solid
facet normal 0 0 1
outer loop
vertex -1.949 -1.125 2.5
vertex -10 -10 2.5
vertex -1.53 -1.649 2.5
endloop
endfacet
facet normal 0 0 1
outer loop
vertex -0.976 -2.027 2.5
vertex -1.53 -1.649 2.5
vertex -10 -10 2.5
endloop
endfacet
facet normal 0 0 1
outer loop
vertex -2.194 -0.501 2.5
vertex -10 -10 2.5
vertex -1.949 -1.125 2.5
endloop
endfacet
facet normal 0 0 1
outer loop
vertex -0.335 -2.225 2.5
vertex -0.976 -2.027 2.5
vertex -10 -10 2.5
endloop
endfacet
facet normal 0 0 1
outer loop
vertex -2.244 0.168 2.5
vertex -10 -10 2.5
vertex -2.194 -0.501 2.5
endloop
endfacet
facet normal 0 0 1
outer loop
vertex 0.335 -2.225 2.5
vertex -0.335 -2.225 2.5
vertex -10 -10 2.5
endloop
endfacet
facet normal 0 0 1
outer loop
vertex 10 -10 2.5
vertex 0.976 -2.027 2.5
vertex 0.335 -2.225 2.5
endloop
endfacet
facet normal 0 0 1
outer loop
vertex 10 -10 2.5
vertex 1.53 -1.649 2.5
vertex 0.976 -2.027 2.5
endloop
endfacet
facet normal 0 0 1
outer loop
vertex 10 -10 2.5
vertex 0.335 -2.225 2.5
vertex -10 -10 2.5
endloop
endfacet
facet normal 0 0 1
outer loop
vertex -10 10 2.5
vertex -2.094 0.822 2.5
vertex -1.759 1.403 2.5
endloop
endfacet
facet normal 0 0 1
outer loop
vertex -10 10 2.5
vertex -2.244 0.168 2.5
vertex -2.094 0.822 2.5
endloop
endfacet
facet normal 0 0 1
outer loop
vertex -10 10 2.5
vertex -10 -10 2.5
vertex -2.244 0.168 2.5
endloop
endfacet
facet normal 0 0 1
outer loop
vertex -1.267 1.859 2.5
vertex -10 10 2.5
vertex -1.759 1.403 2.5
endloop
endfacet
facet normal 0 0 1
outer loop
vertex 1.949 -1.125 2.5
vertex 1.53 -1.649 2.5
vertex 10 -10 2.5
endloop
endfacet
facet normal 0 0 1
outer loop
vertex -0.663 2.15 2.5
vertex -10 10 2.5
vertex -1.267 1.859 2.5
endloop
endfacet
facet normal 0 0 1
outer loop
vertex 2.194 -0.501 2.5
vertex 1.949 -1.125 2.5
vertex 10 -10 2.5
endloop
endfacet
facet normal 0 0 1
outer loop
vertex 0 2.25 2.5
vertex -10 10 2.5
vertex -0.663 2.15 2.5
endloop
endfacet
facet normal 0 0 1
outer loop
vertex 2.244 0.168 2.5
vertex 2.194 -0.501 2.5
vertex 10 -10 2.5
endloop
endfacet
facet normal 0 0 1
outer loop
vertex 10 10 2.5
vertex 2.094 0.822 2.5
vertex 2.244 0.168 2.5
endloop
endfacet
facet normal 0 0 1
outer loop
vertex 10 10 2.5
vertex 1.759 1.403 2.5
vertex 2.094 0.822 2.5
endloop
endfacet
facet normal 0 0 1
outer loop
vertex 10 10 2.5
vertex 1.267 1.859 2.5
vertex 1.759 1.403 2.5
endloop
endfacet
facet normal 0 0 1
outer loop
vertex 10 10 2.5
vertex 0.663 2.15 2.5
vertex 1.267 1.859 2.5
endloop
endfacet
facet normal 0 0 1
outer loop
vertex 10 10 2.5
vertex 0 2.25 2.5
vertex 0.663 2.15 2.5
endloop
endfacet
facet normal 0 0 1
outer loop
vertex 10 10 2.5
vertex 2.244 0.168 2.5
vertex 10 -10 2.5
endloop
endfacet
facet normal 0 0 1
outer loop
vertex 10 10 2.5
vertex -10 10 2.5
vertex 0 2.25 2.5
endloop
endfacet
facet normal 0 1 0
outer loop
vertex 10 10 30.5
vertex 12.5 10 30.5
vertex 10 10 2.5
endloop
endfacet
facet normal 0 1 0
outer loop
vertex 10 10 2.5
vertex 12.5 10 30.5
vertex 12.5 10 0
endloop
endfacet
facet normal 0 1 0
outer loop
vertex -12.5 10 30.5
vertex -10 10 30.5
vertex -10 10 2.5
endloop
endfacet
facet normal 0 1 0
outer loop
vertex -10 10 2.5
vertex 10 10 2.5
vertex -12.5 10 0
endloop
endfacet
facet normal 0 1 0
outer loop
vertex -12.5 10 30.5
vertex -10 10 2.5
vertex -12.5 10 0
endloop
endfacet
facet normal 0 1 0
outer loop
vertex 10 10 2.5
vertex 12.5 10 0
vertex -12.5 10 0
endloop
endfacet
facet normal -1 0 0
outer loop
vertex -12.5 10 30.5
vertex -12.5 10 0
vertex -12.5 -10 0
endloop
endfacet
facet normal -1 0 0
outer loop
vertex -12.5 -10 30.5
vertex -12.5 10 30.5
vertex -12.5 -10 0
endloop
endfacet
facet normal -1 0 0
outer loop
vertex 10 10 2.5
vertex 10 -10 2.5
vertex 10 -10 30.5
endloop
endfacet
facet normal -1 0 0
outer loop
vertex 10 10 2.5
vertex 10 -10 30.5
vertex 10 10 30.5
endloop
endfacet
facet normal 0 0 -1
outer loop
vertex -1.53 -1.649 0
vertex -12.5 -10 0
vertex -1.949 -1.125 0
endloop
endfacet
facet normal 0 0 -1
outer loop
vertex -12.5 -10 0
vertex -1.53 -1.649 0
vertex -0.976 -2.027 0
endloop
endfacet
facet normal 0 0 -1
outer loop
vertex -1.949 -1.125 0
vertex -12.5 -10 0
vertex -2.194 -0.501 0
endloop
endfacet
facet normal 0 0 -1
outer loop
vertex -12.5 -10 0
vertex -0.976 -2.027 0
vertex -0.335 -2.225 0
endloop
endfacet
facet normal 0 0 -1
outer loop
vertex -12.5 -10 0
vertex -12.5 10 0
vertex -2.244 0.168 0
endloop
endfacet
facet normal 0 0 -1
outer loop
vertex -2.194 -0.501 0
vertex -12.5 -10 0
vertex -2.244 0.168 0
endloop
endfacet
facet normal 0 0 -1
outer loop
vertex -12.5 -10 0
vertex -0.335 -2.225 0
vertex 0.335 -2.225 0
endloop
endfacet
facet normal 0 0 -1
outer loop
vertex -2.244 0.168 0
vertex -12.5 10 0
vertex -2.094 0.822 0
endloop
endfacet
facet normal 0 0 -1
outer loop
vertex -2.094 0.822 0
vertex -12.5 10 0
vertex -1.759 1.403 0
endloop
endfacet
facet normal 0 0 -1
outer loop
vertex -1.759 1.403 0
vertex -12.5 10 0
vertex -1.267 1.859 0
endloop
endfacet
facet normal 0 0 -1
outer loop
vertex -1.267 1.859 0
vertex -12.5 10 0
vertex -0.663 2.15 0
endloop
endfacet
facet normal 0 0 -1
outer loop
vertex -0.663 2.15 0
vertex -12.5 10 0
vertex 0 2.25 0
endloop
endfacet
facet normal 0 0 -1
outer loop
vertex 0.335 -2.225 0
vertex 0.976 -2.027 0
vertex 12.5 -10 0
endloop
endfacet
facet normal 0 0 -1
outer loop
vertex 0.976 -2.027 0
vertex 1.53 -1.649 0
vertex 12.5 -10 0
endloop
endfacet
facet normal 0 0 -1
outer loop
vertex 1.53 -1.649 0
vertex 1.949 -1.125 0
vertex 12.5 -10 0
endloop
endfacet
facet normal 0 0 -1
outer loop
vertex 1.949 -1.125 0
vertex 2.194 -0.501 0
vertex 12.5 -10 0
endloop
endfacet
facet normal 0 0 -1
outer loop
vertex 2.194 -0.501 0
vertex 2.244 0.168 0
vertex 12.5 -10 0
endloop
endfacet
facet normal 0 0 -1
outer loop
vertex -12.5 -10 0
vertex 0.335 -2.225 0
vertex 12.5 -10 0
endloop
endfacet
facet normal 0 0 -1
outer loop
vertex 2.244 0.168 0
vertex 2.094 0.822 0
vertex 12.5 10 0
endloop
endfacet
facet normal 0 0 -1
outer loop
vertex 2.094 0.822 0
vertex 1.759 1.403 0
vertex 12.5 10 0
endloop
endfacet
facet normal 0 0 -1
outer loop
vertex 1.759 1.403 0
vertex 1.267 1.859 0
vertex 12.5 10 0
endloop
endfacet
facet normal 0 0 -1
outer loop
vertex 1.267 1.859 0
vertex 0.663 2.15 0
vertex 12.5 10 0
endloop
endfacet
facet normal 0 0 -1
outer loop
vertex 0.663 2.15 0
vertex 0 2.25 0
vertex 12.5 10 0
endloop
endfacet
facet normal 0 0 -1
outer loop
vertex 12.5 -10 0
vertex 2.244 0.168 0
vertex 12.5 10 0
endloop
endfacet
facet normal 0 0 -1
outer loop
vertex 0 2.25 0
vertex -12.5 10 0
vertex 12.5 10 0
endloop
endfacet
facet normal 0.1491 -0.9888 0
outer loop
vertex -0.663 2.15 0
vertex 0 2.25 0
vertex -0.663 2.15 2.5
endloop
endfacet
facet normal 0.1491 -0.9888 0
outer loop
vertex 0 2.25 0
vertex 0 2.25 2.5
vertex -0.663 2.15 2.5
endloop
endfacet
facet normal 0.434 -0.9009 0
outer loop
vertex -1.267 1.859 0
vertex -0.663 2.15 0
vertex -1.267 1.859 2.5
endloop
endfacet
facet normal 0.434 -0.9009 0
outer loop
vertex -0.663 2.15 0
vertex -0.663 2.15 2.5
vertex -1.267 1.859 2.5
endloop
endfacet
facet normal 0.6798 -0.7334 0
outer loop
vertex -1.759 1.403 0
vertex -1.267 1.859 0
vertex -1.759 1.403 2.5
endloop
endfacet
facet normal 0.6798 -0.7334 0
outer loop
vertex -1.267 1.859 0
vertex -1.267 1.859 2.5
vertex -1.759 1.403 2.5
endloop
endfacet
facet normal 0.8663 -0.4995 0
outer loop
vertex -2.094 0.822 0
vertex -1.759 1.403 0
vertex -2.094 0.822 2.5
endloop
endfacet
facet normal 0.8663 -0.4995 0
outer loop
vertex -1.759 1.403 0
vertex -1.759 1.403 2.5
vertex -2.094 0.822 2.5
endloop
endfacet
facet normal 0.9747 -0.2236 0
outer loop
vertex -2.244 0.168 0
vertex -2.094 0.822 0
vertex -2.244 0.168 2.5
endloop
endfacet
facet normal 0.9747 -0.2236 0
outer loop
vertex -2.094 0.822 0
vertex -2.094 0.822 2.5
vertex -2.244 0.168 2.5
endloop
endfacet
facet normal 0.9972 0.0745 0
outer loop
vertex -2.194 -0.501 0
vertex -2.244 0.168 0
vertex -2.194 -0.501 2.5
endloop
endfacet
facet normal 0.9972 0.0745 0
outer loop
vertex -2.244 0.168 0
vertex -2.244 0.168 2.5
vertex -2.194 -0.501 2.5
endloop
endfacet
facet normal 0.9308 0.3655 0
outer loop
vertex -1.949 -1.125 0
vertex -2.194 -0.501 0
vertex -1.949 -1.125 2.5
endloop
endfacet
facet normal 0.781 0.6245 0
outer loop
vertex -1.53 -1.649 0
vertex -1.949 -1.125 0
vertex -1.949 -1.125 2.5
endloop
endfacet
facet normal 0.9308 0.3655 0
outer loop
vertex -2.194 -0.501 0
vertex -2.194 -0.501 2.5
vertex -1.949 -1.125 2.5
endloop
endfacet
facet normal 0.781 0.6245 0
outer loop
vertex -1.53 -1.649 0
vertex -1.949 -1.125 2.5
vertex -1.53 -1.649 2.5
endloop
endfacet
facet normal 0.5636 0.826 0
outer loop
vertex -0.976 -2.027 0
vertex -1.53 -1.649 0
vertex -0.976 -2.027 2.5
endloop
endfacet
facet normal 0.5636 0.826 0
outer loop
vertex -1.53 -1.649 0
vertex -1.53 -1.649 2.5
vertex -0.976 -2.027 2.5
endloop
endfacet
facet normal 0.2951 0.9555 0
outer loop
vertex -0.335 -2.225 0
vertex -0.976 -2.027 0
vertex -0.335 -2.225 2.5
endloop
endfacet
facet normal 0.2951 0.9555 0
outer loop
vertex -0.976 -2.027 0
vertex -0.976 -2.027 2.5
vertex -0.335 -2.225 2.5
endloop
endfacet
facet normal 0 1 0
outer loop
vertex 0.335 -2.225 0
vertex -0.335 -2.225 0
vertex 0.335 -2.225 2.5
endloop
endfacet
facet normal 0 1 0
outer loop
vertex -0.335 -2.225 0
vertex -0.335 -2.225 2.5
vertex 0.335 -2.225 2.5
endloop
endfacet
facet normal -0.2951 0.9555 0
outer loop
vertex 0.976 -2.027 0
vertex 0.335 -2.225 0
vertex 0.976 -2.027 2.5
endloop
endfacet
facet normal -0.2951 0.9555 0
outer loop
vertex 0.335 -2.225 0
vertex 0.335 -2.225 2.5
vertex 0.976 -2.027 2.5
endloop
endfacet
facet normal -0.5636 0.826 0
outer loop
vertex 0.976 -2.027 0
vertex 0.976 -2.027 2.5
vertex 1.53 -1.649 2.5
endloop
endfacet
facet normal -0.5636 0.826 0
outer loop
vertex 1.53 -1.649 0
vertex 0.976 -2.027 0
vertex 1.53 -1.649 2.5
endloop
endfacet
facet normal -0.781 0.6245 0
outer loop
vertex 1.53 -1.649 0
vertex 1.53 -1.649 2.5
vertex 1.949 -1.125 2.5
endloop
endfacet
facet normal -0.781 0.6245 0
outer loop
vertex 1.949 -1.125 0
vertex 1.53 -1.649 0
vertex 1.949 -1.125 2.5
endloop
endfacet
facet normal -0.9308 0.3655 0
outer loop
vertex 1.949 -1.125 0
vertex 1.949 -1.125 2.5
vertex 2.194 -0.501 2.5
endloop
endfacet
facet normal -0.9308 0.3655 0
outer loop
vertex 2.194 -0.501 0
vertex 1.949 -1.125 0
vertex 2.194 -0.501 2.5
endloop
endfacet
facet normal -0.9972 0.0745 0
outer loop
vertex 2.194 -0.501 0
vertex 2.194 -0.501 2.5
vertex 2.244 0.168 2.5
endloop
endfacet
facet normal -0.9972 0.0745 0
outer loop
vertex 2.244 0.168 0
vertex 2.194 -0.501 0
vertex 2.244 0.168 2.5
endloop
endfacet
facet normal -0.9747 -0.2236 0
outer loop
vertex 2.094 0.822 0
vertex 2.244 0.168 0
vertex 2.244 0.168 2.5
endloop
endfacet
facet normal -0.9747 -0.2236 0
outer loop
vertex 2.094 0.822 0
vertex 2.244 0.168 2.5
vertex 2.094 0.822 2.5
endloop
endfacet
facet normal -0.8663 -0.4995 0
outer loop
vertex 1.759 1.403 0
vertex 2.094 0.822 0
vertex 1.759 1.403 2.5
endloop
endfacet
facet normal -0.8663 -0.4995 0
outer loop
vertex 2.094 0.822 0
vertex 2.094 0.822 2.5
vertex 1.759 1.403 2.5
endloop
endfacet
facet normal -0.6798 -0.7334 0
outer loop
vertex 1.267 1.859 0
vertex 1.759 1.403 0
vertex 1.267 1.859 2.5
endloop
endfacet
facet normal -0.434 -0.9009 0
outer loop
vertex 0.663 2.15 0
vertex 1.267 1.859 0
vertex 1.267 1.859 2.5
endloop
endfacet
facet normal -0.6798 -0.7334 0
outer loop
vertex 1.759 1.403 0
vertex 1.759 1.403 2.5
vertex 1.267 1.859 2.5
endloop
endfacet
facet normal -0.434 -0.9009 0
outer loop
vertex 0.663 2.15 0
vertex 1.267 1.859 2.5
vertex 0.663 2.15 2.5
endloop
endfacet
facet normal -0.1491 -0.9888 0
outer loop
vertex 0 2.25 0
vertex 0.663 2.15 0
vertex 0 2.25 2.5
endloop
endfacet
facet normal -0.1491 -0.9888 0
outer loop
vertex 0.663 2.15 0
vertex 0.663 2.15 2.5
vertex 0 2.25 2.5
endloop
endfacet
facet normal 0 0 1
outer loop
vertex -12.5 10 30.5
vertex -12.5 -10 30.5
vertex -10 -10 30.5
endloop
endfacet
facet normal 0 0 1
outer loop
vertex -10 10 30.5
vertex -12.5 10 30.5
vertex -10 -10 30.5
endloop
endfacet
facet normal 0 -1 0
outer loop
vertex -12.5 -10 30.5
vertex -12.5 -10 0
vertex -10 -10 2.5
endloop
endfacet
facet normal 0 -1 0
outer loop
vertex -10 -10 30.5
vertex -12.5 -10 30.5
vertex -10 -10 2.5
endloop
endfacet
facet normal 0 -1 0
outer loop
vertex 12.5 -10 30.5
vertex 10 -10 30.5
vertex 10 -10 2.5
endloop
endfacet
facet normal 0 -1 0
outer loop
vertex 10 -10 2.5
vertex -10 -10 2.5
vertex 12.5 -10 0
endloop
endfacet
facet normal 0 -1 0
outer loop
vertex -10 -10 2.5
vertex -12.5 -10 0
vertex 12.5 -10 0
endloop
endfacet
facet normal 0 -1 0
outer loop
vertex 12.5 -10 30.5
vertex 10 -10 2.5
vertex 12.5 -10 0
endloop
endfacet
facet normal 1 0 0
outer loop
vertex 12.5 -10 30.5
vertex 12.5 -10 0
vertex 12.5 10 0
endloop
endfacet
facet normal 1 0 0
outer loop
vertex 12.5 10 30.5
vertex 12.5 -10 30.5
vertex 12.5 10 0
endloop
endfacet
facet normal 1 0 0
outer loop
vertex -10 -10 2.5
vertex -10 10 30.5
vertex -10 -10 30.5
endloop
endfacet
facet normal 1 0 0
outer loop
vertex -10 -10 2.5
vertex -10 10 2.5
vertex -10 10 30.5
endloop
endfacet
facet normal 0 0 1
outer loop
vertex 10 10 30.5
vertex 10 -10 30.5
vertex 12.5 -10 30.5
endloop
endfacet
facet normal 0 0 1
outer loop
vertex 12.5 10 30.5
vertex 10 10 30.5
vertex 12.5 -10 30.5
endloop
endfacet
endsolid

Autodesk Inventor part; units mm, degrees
ref_plane "YZ Plane" through (0, 0, 0) normal (1, 0, 0) x (0, 1, 0)
ref_plane "XZ Plane" through (0, 0, 0) normal (0, 1, 0) x (-1, 0, 0)
ref_plane "XY Plane" through (0, 0, 0) normal (0, 0, 1) x (1, 0, 0)
sketch "Sketch1" plane through (0, 0, 0) normal (0, 0, 1) x (1, 0, 0)
  line L0 (-12.5, -10) -> (12.5, -10)
  line L1 (12.5, -10) -> (12.5, 10)
  line L2 (12.5, 10) -> (-12.5, 10)
  line L3 (-12.5, 10) -> (-12.5, -10)
  line L4 (-12.5, -10) -> (12.5, 10) construction
  line L5 (12.5, -10) -> (-12.5, 10) construction
  line L6 (-12.5, 10) -> (-10, 10)
  line L7 (-10, 10) -> (-10, -10)
  line L8 (-10, -10) -> (-12.5, -10)
  line L9 (-12.5, -10) -> (-12.5, 10)
  line L10 (12.5, -10) -> (10, -10)
  line L11 (10, -10) -> (10, 10)
  line L12 (10, 10) -> (12.5, 10)
  line L13 (12.5, 10) -> (12.5, -10)
  point P0 (0, 0)
  point P1 (0, 0)
  dimension "d0" = 25
  dimension "d1" = 20
  dimension "d2" = 2.5
  dimension "d3" = 2.5
extrude "Extrusion1" add sketch "Sketch1" along normal blind 2.5 contours L7 L2 L11 L0
extrude "Extrusion2" add sketch "Sketch1" along normal blind 30.5 contours L3 L2 L7 L0 | L11 L2 L1 L0
hole "Hole1" at (0, 0, 0) direction (0, 0, 1) diameter 4.5 end through all both
properties part number "slotcar_beam"
